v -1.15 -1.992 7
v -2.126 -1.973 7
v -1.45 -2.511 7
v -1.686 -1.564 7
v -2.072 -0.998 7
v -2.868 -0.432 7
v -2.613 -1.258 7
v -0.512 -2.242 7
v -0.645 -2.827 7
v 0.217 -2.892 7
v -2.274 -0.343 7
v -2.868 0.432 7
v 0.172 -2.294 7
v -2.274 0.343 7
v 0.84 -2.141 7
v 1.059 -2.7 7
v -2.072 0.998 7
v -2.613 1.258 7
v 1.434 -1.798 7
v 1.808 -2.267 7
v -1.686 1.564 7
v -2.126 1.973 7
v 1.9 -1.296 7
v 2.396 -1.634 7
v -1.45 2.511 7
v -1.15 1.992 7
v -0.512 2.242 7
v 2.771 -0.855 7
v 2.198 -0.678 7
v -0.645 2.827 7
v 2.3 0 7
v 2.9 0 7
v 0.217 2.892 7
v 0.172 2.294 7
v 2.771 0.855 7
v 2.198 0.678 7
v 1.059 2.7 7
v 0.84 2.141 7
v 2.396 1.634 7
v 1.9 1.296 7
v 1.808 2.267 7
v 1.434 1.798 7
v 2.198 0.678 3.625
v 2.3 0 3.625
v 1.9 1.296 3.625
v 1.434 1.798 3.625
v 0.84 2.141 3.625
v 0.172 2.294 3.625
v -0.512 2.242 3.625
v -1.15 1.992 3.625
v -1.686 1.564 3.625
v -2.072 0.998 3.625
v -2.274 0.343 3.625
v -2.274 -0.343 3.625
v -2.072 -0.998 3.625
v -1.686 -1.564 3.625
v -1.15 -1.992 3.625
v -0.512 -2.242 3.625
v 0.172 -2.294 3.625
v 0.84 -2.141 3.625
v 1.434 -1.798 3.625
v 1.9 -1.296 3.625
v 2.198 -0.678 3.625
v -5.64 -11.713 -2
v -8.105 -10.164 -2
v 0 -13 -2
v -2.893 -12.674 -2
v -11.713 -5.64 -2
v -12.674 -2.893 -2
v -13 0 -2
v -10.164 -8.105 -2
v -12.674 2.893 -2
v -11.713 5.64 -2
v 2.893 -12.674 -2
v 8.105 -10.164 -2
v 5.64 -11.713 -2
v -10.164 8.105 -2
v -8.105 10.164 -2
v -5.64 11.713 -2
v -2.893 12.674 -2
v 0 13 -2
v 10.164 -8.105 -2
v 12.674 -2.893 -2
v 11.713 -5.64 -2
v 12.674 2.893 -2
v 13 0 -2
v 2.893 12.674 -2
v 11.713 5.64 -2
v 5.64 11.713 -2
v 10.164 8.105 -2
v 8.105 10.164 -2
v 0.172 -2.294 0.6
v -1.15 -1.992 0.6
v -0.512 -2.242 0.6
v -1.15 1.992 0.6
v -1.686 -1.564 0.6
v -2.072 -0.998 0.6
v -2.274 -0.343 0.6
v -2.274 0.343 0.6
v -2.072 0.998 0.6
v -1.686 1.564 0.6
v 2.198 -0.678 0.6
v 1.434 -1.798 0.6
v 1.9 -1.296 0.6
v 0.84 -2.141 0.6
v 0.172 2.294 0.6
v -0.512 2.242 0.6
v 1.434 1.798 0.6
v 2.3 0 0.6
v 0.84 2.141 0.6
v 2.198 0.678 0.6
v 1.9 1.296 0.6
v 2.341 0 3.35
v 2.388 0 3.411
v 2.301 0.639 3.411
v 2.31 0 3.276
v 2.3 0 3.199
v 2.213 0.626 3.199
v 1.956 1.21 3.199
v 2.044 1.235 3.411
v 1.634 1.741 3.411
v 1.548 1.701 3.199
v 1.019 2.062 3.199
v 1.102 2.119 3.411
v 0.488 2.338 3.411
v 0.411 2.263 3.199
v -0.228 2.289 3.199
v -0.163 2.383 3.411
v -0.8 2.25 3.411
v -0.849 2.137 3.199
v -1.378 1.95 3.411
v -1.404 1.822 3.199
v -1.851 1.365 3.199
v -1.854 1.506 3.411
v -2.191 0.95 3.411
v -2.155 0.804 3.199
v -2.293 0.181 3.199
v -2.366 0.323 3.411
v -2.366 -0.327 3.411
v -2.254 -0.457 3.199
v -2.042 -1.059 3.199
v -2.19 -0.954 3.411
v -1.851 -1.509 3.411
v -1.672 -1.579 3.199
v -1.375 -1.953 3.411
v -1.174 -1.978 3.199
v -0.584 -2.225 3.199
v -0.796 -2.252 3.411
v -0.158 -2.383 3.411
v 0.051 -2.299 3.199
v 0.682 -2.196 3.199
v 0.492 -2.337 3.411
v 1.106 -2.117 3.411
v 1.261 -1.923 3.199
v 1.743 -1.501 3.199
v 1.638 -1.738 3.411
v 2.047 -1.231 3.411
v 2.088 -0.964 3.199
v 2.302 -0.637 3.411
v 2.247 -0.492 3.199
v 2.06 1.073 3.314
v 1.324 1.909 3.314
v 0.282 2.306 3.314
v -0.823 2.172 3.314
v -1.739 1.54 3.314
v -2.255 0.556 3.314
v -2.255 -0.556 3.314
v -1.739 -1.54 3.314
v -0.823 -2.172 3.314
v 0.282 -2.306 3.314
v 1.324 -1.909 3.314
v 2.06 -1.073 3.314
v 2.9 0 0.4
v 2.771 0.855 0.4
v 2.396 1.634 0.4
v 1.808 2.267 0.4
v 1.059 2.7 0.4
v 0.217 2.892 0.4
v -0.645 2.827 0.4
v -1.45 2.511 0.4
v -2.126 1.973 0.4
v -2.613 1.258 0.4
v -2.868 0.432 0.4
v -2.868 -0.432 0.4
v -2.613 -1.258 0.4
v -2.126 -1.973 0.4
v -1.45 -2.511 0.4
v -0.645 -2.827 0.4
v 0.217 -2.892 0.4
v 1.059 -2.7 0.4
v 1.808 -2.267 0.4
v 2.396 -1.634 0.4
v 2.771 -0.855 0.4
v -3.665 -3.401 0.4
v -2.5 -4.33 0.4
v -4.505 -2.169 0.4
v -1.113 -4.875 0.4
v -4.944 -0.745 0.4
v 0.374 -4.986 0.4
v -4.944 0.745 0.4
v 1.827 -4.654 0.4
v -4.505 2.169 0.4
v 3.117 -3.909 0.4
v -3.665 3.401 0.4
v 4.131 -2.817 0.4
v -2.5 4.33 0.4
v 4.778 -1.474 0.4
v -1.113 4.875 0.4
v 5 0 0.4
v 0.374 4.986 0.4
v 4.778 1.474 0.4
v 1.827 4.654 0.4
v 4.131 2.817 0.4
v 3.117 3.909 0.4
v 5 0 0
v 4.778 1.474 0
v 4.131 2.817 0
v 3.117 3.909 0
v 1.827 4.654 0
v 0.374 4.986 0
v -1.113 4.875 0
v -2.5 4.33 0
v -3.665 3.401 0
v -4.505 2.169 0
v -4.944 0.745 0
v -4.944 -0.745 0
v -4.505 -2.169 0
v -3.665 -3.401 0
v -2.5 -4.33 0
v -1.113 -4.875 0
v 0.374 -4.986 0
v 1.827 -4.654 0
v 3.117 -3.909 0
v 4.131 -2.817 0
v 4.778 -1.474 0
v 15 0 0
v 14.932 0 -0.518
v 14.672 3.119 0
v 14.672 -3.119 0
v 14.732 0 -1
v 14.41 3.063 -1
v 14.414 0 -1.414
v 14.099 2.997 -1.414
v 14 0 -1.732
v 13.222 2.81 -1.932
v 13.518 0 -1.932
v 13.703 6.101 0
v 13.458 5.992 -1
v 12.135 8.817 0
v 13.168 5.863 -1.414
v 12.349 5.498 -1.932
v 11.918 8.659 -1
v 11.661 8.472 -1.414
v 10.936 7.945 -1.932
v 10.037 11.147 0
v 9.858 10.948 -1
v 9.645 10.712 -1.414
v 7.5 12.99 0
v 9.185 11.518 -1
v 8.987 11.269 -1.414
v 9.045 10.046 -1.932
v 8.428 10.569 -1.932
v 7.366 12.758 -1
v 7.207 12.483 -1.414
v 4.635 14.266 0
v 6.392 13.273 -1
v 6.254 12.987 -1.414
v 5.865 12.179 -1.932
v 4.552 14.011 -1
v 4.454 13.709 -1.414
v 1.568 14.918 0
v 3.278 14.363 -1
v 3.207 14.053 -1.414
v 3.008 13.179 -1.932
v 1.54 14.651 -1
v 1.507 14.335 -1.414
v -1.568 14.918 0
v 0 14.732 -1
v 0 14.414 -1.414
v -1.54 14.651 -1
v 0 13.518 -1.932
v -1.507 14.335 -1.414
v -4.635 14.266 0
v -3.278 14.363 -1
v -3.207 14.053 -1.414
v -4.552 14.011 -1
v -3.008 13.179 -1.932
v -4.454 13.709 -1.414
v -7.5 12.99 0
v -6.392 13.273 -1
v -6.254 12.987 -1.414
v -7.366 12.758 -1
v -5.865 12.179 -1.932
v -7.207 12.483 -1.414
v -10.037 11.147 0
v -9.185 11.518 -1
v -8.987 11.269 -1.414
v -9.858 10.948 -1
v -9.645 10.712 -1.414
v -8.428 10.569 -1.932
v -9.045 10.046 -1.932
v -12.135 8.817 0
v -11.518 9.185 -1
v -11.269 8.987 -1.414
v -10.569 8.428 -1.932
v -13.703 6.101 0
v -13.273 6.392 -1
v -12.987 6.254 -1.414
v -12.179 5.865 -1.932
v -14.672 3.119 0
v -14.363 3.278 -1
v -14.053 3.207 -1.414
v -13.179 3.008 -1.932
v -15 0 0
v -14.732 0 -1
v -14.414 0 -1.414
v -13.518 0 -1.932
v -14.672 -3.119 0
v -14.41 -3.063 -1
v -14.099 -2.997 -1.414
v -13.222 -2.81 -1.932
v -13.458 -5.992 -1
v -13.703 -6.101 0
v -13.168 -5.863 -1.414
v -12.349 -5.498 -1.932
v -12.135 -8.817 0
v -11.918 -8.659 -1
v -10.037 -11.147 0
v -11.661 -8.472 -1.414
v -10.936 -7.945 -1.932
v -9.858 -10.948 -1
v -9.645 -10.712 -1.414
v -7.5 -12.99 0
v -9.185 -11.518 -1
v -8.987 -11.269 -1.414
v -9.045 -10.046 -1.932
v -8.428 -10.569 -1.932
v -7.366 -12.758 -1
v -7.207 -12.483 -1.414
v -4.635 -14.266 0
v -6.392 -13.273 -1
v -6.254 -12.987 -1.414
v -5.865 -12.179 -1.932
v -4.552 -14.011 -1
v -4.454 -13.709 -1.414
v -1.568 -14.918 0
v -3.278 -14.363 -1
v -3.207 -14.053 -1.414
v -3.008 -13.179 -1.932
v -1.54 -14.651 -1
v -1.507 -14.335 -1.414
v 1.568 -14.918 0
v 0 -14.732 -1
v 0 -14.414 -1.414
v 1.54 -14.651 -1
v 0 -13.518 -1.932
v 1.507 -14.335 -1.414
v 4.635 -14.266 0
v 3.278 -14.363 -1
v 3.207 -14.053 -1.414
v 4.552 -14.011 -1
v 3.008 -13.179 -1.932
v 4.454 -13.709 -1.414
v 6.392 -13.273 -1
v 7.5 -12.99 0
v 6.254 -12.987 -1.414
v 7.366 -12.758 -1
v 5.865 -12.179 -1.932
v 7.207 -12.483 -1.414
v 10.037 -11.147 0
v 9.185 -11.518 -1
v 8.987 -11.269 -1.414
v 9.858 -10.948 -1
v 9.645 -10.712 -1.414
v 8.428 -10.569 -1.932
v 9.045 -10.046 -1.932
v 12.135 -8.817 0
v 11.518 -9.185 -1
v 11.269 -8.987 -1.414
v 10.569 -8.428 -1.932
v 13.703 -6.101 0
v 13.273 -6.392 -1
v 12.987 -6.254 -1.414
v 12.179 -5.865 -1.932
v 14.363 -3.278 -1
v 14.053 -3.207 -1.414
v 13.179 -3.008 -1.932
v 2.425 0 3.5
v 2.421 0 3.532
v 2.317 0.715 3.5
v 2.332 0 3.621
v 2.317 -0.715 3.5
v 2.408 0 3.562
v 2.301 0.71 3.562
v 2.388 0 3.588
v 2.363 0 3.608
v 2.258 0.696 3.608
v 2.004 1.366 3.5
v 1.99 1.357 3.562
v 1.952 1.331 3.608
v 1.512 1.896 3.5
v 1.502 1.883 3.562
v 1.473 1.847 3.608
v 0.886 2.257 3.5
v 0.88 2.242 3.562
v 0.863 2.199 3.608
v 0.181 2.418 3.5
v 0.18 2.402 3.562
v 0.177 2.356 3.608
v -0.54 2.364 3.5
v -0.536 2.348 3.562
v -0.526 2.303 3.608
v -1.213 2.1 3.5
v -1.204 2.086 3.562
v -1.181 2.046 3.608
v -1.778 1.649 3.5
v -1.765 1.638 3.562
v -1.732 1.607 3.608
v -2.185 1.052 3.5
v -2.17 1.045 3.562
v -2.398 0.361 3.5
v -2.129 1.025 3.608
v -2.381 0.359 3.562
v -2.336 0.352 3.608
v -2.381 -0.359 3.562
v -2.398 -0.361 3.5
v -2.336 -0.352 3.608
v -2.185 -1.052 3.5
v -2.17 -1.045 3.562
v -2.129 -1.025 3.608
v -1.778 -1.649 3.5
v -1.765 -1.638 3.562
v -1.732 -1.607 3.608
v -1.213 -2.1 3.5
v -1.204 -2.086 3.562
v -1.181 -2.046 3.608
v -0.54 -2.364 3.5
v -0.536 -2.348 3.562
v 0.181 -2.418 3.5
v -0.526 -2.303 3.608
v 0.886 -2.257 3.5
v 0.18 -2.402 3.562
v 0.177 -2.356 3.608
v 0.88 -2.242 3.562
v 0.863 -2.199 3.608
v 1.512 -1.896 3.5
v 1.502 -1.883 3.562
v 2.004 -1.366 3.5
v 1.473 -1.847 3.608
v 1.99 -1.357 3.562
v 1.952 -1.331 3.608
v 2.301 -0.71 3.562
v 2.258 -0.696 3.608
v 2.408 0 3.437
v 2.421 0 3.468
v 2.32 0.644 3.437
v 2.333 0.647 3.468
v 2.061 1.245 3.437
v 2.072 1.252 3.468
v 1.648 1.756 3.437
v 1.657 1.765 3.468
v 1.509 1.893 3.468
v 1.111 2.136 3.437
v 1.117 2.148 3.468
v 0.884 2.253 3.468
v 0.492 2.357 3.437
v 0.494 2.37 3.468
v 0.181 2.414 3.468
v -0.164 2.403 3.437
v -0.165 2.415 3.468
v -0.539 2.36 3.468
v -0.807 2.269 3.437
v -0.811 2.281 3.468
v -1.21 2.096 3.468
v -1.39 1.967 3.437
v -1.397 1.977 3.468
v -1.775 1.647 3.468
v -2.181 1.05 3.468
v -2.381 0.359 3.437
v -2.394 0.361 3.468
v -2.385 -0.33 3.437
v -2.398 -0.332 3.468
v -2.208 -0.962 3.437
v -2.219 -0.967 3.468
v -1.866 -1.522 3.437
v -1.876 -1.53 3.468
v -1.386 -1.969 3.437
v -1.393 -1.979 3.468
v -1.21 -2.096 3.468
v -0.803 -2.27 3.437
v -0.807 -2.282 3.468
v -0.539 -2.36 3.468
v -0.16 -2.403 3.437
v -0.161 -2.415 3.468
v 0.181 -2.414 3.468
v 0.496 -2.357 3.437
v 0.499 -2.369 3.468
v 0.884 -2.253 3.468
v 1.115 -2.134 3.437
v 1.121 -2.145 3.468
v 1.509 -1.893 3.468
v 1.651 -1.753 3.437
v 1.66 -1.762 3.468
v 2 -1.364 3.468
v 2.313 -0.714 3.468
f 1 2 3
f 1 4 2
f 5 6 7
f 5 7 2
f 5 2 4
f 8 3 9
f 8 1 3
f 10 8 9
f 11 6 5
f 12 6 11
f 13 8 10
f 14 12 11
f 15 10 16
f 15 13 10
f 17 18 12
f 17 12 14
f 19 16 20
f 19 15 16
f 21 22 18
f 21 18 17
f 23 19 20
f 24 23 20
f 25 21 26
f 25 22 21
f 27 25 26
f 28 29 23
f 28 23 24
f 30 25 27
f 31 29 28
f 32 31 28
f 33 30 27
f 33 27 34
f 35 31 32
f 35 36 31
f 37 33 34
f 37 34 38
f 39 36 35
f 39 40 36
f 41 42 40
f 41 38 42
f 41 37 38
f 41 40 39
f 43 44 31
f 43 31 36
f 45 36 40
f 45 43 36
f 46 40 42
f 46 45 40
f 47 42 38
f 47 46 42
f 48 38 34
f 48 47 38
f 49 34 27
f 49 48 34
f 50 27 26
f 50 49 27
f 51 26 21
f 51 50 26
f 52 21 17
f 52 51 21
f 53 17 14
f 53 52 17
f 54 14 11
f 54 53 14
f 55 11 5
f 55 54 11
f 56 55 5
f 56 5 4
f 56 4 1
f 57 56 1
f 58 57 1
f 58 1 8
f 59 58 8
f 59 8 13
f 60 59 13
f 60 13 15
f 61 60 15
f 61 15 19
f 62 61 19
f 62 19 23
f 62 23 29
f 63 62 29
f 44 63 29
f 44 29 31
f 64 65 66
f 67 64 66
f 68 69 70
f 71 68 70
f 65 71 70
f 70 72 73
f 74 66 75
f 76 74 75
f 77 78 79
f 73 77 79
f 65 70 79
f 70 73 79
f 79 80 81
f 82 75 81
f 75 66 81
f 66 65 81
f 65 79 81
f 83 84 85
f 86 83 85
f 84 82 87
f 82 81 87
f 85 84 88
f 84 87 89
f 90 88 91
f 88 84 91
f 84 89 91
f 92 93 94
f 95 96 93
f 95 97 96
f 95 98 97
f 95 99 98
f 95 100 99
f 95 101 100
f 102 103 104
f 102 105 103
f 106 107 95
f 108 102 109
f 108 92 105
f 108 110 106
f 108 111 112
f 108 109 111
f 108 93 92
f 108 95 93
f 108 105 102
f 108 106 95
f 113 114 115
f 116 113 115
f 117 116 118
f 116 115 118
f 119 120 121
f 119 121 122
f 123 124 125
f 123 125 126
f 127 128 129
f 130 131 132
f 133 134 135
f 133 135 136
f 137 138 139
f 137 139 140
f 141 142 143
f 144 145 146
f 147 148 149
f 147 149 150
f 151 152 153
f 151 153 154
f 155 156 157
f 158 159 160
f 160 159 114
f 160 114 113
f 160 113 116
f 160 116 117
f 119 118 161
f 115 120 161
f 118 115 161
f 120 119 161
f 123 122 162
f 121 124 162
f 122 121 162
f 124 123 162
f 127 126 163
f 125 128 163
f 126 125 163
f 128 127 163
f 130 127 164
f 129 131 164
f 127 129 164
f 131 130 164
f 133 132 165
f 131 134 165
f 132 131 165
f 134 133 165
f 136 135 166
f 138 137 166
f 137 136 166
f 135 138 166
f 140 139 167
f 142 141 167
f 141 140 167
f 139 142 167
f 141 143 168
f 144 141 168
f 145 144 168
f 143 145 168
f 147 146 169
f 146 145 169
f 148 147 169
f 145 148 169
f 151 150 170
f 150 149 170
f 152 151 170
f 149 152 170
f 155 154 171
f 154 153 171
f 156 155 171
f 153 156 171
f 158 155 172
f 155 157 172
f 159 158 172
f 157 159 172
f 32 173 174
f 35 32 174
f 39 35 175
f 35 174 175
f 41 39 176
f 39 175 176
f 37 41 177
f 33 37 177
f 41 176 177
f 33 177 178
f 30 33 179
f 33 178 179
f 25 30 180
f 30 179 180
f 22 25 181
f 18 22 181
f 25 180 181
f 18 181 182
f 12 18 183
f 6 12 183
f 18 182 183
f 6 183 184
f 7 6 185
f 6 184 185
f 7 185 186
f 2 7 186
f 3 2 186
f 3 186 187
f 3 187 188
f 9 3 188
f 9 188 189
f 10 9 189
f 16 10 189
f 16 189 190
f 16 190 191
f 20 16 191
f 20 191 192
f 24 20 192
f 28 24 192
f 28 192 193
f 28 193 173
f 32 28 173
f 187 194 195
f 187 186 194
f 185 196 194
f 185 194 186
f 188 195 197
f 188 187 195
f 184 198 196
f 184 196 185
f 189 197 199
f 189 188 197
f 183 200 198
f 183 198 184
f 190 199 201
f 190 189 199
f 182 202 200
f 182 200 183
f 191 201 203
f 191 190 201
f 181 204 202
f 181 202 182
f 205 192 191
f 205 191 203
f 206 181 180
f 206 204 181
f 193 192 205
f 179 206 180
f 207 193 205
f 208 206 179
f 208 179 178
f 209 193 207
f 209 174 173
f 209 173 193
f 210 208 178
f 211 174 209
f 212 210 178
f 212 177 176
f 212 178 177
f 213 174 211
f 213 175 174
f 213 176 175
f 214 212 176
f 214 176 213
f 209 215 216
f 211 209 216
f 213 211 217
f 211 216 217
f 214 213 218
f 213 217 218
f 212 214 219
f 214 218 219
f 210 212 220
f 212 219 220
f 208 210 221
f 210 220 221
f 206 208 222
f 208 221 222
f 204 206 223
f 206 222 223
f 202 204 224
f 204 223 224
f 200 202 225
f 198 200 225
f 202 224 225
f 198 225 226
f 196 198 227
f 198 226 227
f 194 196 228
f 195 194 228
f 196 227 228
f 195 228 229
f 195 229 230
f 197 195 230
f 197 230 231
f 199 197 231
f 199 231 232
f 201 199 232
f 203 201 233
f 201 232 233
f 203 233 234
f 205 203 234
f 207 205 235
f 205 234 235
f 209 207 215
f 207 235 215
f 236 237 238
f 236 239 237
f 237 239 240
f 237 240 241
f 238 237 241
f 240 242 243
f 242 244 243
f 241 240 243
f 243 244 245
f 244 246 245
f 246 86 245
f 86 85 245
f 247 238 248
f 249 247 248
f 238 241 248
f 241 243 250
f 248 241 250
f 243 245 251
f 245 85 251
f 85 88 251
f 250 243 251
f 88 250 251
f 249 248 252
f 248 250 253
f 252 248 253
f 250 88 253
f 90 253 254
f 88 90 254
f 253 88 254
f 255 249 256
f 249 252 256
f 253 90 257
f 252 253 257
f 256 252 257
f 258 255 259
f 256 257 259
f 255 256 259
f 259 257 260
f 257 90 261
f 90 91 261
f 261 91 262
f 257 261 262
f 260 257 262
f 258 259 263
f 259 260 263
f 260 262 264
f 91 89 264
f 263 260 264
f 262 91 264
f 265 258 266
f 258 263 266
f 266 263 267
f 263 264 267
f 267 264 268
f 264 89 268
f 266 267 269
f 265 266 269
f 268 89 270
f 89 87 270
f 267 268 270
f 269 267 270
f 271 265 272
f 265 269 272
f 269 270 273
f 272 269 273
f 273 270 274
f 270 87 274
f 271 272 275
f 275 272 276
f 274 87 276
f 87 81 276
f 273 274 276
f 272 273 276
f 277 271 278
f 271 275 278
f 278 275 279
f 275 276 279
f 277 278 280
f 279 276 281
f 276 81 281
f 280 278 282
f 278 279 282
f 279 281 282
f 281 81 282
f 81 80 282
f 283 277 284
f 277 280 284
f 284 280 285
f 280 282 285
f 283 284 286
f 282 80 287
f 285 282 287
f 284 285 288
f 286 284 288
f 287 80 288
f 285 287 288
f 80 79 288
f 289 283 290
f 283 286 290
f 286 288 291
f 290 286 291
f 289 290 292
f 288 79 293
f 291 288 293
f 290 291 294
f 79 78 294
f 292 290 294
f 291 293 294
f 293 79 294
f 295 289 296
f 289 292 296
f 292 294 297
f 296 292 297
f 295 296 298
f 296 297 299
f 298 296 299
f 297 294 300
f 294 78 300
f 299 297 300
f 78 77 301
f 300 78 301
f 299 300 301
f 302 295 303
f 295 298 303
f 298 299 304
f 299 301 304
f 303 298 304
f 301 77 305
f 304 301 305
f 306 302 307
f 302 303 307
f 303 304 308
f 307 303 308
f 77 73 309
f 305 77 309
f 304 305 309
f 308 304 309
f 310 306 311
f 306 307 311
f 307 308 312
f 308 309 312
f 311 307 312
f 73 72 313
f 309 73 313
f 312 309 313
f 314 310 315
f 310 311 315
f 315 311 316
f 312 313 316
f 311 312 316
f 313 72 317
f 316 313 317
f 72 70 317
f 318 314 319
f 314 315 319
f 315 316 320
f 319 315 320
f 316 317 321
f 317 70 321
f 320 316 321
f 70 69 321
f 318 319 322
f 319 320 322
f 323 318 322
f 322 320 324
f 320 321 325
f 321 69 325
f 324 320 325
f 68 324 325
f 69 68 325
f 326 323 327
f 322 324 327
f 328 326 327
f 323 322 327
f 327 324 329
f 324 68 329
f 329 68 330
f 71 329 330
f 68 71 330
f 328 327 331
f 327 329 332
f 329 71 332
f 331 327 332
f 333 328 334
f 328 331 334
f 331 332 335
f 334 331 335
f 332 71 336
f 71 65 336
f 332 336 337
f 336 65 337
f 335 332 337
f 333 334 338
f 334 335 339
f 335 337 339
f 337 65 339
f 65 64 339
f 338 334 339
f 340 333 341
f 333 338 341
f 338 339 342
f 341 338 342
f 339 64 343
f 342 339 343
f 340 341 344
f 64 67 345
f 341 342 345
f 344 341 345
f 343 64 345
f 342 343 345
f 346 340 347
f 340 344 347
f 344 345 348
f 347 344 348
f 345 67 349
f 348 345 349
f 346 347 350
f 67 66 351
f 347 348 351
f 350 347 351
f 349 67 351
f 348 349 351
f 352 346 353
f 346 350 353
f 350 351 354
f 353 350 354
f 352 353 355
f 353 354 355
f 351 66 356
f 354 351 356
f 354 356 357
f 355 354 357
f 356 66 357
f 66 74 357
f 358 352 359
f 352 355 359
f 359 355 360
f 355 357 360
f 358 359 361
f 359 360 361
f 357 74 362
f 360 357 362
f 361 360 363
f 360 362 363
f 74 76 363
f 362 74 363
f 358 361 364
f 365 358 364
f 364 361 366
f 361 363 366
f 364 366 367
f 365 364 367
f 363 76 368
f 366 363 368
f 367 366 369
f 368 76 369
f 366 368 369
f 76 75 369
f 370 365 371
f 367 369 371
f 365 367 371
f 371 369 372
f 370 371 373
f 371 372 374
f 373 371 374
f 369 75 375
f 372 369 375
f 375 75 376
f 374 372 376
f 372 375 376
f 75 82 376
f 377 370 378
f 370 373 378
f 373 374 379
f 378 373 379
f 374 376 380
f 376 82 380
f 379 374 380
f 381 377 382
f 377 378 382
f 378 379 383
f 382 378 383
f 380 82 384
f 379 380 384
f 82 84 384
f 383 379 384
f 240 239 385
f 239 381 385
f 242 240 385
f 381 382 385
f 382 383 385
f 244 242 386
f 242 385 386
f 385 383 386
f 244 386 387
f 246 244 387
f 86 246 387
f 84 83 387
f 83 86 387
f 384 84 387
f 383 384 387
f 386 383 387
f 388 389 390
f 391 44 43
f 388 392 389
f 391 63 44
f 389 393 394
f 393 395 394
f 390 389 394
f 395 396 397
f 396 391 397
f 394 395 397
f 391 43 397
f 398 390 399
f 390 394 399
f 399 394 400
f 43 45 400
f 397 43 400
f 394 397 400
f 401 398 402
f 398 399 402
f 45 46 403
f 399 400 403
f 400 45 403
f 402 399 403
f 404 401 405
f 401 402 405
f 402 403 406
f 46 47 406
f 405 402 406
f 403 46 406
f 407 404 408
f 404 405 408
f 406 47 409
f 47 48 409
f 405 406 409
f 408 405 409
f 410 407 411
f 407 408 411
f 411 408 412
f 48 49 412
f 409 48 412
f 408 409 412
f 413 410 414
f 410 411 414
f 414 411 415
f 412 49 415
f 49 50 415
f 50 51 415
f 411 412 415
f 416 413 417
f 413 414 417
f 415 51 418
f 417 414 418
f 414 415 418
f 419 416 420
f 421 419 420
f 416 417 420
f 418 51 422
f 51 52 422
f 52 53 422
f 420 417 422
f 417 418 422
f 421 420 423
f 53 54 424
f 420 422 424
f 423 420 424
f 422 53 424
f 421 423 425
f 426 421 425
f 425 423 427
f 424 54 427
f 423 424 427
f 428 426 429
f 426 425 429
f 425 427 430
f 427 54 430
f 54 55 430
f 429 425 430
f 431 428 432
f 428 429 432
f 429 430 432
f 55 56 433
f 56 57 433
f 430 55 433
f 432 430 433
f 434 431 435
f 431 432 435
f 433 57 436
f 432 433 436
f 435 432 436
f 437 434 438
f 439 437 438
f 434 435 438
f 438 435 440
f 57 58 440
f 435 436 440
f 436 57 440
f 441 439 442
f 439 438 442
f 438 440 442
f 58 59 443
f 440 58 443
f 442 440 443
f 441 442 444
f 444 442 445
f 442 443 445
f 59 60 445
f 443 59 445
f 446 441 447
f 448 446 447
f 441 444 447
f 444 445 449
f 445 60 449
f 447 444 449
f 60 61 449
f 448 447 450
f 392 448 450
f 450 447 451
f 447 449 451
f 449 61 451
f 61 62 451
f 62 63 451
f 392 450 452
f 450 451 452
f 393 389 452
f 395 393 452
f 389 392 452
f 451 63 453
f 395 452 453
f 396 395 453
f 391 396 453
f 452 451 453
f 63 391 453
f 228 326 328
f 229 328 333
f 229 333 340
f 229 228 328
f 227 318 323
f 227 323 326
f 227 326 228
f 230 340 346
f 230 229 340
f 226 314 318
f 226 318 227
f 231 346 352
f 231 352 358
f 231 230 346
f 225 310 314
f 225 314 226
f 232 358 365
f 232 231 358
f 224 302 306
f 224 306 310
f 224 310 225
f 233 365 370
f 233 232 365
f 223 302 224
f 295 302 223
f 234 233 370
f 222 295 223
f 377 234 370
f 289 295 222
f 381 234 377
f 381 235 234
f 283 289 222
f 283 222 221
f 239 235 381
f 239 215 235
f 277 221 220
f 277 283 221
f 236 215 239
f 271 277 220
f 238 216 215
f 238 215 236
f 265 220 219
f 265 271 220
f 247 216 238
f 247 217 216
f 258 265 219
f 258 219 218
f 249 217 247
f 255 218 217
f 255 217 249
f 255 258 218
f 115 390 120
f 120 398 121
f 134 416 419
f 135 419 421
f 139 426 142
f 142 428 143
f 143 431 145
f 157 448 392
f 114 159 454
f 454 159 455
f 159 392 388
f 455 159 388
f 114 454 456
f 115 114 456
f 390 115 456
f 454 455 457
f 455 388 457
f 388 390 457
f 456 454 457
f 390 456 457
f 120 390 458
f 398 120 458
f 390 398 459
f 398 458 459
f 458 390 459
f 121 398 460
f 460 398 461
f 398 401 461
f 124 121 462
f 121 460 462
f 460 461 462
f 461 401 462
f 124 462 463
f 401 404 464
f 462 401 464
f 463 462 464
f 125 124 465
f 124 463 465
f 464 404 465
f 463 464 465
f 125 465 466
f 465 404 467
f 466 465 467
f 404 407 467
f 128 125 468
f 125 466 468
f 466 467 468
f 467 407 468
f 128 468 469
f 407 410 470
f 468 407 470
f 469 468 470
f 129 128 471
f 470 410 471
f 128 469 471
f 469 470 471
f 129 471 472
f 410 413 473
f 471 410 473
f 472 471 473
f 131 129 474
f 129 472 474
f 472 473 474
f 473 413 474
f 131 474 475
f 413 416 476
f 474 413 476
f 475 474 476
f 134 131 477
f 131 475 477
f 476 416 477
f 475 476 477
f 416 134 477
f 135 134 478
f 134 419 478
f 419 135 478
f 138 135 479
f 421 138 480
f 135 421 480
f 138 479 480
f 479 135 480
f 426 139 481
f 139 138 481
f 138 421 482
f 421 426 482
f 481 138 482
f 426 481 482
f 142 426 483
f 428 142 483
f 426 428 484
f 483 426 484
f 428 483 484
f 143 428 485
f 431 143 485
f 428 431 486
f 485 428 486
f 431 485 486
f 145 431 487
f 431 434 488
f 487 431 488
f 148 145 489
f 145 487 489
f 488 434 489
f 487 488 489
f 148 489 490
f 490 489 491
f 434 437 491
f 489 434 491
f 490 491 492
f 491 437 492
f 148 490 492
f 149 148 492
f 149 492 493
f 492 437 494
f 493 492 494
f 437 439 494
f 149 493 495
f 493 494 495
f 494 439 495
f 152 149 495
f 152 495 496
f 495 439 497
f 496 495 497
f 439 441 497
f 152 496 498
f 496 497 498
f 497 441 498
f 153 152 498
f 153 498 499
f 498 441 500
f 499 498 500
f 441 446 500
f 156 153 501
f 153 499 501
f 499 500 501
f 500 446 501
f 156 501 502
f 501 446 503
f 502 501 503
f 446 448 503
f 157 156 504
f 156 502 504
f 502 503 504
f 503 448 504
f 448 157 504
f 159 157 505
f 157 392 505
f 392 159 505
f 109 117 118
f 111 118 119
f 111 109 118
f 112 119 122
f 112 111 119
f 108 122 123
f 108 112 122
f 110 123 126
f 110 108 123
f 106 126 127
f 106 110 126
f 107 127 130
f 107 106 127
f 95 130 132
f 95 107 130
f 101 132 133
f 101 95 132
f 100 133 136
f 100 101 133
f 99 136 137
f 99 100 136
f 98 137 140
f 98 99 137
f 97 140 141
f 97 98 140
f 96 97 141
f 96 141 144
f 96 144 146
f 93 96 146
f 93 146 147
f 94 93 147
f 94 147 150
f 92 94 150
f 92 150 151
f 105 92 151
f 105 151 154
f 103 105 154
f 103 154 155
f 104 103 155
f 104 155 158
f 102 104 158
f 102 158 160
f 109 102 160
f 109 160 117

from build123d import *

# Parameters (mm, degrees)
F0_R     = 2.9
F1_DEPTH = 7
F2_T     = -0.6
F0_R_2   = 15
F0_R_3   = 5
F3_DEPTH = 2
F4_R     = 1.99999
F7_R     = 0.3
F8_DEPTH = 0.4


# Not quite as in the source:
# - a fillet or chamfer is up to 0.001 mm smaller than in the source, because OpenCascade refuses the exact size


with BuildPart() as f1:
    # F0 (on Top) → F1 (new body)
    with BuildSketch(Plane.XY):
        Circle(F0_R)
    extrude(amount=F1_DEPTH)

    # F2
    f2_openings = [f1.faces().sort_by_distance(p)[0] for p in [
        (0, 0, 7),
    ]]
    offset(amount=F2_T, openings=f2_openings)

    # F0 (on Top) → F3 (join)
    with BuildSketch(Plane.XY):
        Circle(F0_R_2)
        Circle(F0_R_3, mode=Mode.SUBTRACT)
        Circle(F0_R_3)
        Circle(F0_R, mode=Mode.SUBTRACT)
        Circle(F0_R)
    extrude(amount=-F3_DEPTH)

    # F4 (radius 2 in the source; OpenCascade refuses exactly that, so slightly less here)
    f4_edges = [f1.edges().sort_by_distance(p)[0] for p in [
        (-15, 0, -2),
    ]]
    fillet(f4_edges, radius=F4_R)

    # F5 (on Front) → F6 (revolve, cut)
    with BuildSketch(Plane.XZ):
        with BuildLine():
            ThreePointArc((2.175, 3.5), (2.2116116524, 3.4116116524), (2.3, 3.375))
            Line((2.3, 3.375), (2.3, 3.5))
            Line((2.3, 3.5), (2.175, 3.5))
        make_face()
        with BuildLine():
            Line((2.3, 3.5), (2.3, 3.375))
            ThreePointArc((2.3, 3.375), (2.3883883476, 3.4116116524), (2.425, 3.5))
            ThreePointArc((2.425, 3.5), (2.3, 3.625), (2.175, 3.5))
            Line((2.175, 3.5), (2.3, 3.5))
        make_face()
    revolve(axis=Axis((0, 0, 1.75), (0, 0, 1)), mode=Mode.SUBTRACT)

    # F7
    f7_edges = [f1.edges().sort_by_distance(p)[0] for p in [
        (-2.3, 0, 3.375),
    ]]
    fillet(f7_edges, radius=F7_R)

    # F0 (on Top) → F8 (join)
    with BuildSketch(Plane.XY):
        Circle(F0_R_3)
        Circle(F0_R, mode=Mode.SUBTRACT)
    extrude(amount=F8_DEPTH)


solid = f1.part
